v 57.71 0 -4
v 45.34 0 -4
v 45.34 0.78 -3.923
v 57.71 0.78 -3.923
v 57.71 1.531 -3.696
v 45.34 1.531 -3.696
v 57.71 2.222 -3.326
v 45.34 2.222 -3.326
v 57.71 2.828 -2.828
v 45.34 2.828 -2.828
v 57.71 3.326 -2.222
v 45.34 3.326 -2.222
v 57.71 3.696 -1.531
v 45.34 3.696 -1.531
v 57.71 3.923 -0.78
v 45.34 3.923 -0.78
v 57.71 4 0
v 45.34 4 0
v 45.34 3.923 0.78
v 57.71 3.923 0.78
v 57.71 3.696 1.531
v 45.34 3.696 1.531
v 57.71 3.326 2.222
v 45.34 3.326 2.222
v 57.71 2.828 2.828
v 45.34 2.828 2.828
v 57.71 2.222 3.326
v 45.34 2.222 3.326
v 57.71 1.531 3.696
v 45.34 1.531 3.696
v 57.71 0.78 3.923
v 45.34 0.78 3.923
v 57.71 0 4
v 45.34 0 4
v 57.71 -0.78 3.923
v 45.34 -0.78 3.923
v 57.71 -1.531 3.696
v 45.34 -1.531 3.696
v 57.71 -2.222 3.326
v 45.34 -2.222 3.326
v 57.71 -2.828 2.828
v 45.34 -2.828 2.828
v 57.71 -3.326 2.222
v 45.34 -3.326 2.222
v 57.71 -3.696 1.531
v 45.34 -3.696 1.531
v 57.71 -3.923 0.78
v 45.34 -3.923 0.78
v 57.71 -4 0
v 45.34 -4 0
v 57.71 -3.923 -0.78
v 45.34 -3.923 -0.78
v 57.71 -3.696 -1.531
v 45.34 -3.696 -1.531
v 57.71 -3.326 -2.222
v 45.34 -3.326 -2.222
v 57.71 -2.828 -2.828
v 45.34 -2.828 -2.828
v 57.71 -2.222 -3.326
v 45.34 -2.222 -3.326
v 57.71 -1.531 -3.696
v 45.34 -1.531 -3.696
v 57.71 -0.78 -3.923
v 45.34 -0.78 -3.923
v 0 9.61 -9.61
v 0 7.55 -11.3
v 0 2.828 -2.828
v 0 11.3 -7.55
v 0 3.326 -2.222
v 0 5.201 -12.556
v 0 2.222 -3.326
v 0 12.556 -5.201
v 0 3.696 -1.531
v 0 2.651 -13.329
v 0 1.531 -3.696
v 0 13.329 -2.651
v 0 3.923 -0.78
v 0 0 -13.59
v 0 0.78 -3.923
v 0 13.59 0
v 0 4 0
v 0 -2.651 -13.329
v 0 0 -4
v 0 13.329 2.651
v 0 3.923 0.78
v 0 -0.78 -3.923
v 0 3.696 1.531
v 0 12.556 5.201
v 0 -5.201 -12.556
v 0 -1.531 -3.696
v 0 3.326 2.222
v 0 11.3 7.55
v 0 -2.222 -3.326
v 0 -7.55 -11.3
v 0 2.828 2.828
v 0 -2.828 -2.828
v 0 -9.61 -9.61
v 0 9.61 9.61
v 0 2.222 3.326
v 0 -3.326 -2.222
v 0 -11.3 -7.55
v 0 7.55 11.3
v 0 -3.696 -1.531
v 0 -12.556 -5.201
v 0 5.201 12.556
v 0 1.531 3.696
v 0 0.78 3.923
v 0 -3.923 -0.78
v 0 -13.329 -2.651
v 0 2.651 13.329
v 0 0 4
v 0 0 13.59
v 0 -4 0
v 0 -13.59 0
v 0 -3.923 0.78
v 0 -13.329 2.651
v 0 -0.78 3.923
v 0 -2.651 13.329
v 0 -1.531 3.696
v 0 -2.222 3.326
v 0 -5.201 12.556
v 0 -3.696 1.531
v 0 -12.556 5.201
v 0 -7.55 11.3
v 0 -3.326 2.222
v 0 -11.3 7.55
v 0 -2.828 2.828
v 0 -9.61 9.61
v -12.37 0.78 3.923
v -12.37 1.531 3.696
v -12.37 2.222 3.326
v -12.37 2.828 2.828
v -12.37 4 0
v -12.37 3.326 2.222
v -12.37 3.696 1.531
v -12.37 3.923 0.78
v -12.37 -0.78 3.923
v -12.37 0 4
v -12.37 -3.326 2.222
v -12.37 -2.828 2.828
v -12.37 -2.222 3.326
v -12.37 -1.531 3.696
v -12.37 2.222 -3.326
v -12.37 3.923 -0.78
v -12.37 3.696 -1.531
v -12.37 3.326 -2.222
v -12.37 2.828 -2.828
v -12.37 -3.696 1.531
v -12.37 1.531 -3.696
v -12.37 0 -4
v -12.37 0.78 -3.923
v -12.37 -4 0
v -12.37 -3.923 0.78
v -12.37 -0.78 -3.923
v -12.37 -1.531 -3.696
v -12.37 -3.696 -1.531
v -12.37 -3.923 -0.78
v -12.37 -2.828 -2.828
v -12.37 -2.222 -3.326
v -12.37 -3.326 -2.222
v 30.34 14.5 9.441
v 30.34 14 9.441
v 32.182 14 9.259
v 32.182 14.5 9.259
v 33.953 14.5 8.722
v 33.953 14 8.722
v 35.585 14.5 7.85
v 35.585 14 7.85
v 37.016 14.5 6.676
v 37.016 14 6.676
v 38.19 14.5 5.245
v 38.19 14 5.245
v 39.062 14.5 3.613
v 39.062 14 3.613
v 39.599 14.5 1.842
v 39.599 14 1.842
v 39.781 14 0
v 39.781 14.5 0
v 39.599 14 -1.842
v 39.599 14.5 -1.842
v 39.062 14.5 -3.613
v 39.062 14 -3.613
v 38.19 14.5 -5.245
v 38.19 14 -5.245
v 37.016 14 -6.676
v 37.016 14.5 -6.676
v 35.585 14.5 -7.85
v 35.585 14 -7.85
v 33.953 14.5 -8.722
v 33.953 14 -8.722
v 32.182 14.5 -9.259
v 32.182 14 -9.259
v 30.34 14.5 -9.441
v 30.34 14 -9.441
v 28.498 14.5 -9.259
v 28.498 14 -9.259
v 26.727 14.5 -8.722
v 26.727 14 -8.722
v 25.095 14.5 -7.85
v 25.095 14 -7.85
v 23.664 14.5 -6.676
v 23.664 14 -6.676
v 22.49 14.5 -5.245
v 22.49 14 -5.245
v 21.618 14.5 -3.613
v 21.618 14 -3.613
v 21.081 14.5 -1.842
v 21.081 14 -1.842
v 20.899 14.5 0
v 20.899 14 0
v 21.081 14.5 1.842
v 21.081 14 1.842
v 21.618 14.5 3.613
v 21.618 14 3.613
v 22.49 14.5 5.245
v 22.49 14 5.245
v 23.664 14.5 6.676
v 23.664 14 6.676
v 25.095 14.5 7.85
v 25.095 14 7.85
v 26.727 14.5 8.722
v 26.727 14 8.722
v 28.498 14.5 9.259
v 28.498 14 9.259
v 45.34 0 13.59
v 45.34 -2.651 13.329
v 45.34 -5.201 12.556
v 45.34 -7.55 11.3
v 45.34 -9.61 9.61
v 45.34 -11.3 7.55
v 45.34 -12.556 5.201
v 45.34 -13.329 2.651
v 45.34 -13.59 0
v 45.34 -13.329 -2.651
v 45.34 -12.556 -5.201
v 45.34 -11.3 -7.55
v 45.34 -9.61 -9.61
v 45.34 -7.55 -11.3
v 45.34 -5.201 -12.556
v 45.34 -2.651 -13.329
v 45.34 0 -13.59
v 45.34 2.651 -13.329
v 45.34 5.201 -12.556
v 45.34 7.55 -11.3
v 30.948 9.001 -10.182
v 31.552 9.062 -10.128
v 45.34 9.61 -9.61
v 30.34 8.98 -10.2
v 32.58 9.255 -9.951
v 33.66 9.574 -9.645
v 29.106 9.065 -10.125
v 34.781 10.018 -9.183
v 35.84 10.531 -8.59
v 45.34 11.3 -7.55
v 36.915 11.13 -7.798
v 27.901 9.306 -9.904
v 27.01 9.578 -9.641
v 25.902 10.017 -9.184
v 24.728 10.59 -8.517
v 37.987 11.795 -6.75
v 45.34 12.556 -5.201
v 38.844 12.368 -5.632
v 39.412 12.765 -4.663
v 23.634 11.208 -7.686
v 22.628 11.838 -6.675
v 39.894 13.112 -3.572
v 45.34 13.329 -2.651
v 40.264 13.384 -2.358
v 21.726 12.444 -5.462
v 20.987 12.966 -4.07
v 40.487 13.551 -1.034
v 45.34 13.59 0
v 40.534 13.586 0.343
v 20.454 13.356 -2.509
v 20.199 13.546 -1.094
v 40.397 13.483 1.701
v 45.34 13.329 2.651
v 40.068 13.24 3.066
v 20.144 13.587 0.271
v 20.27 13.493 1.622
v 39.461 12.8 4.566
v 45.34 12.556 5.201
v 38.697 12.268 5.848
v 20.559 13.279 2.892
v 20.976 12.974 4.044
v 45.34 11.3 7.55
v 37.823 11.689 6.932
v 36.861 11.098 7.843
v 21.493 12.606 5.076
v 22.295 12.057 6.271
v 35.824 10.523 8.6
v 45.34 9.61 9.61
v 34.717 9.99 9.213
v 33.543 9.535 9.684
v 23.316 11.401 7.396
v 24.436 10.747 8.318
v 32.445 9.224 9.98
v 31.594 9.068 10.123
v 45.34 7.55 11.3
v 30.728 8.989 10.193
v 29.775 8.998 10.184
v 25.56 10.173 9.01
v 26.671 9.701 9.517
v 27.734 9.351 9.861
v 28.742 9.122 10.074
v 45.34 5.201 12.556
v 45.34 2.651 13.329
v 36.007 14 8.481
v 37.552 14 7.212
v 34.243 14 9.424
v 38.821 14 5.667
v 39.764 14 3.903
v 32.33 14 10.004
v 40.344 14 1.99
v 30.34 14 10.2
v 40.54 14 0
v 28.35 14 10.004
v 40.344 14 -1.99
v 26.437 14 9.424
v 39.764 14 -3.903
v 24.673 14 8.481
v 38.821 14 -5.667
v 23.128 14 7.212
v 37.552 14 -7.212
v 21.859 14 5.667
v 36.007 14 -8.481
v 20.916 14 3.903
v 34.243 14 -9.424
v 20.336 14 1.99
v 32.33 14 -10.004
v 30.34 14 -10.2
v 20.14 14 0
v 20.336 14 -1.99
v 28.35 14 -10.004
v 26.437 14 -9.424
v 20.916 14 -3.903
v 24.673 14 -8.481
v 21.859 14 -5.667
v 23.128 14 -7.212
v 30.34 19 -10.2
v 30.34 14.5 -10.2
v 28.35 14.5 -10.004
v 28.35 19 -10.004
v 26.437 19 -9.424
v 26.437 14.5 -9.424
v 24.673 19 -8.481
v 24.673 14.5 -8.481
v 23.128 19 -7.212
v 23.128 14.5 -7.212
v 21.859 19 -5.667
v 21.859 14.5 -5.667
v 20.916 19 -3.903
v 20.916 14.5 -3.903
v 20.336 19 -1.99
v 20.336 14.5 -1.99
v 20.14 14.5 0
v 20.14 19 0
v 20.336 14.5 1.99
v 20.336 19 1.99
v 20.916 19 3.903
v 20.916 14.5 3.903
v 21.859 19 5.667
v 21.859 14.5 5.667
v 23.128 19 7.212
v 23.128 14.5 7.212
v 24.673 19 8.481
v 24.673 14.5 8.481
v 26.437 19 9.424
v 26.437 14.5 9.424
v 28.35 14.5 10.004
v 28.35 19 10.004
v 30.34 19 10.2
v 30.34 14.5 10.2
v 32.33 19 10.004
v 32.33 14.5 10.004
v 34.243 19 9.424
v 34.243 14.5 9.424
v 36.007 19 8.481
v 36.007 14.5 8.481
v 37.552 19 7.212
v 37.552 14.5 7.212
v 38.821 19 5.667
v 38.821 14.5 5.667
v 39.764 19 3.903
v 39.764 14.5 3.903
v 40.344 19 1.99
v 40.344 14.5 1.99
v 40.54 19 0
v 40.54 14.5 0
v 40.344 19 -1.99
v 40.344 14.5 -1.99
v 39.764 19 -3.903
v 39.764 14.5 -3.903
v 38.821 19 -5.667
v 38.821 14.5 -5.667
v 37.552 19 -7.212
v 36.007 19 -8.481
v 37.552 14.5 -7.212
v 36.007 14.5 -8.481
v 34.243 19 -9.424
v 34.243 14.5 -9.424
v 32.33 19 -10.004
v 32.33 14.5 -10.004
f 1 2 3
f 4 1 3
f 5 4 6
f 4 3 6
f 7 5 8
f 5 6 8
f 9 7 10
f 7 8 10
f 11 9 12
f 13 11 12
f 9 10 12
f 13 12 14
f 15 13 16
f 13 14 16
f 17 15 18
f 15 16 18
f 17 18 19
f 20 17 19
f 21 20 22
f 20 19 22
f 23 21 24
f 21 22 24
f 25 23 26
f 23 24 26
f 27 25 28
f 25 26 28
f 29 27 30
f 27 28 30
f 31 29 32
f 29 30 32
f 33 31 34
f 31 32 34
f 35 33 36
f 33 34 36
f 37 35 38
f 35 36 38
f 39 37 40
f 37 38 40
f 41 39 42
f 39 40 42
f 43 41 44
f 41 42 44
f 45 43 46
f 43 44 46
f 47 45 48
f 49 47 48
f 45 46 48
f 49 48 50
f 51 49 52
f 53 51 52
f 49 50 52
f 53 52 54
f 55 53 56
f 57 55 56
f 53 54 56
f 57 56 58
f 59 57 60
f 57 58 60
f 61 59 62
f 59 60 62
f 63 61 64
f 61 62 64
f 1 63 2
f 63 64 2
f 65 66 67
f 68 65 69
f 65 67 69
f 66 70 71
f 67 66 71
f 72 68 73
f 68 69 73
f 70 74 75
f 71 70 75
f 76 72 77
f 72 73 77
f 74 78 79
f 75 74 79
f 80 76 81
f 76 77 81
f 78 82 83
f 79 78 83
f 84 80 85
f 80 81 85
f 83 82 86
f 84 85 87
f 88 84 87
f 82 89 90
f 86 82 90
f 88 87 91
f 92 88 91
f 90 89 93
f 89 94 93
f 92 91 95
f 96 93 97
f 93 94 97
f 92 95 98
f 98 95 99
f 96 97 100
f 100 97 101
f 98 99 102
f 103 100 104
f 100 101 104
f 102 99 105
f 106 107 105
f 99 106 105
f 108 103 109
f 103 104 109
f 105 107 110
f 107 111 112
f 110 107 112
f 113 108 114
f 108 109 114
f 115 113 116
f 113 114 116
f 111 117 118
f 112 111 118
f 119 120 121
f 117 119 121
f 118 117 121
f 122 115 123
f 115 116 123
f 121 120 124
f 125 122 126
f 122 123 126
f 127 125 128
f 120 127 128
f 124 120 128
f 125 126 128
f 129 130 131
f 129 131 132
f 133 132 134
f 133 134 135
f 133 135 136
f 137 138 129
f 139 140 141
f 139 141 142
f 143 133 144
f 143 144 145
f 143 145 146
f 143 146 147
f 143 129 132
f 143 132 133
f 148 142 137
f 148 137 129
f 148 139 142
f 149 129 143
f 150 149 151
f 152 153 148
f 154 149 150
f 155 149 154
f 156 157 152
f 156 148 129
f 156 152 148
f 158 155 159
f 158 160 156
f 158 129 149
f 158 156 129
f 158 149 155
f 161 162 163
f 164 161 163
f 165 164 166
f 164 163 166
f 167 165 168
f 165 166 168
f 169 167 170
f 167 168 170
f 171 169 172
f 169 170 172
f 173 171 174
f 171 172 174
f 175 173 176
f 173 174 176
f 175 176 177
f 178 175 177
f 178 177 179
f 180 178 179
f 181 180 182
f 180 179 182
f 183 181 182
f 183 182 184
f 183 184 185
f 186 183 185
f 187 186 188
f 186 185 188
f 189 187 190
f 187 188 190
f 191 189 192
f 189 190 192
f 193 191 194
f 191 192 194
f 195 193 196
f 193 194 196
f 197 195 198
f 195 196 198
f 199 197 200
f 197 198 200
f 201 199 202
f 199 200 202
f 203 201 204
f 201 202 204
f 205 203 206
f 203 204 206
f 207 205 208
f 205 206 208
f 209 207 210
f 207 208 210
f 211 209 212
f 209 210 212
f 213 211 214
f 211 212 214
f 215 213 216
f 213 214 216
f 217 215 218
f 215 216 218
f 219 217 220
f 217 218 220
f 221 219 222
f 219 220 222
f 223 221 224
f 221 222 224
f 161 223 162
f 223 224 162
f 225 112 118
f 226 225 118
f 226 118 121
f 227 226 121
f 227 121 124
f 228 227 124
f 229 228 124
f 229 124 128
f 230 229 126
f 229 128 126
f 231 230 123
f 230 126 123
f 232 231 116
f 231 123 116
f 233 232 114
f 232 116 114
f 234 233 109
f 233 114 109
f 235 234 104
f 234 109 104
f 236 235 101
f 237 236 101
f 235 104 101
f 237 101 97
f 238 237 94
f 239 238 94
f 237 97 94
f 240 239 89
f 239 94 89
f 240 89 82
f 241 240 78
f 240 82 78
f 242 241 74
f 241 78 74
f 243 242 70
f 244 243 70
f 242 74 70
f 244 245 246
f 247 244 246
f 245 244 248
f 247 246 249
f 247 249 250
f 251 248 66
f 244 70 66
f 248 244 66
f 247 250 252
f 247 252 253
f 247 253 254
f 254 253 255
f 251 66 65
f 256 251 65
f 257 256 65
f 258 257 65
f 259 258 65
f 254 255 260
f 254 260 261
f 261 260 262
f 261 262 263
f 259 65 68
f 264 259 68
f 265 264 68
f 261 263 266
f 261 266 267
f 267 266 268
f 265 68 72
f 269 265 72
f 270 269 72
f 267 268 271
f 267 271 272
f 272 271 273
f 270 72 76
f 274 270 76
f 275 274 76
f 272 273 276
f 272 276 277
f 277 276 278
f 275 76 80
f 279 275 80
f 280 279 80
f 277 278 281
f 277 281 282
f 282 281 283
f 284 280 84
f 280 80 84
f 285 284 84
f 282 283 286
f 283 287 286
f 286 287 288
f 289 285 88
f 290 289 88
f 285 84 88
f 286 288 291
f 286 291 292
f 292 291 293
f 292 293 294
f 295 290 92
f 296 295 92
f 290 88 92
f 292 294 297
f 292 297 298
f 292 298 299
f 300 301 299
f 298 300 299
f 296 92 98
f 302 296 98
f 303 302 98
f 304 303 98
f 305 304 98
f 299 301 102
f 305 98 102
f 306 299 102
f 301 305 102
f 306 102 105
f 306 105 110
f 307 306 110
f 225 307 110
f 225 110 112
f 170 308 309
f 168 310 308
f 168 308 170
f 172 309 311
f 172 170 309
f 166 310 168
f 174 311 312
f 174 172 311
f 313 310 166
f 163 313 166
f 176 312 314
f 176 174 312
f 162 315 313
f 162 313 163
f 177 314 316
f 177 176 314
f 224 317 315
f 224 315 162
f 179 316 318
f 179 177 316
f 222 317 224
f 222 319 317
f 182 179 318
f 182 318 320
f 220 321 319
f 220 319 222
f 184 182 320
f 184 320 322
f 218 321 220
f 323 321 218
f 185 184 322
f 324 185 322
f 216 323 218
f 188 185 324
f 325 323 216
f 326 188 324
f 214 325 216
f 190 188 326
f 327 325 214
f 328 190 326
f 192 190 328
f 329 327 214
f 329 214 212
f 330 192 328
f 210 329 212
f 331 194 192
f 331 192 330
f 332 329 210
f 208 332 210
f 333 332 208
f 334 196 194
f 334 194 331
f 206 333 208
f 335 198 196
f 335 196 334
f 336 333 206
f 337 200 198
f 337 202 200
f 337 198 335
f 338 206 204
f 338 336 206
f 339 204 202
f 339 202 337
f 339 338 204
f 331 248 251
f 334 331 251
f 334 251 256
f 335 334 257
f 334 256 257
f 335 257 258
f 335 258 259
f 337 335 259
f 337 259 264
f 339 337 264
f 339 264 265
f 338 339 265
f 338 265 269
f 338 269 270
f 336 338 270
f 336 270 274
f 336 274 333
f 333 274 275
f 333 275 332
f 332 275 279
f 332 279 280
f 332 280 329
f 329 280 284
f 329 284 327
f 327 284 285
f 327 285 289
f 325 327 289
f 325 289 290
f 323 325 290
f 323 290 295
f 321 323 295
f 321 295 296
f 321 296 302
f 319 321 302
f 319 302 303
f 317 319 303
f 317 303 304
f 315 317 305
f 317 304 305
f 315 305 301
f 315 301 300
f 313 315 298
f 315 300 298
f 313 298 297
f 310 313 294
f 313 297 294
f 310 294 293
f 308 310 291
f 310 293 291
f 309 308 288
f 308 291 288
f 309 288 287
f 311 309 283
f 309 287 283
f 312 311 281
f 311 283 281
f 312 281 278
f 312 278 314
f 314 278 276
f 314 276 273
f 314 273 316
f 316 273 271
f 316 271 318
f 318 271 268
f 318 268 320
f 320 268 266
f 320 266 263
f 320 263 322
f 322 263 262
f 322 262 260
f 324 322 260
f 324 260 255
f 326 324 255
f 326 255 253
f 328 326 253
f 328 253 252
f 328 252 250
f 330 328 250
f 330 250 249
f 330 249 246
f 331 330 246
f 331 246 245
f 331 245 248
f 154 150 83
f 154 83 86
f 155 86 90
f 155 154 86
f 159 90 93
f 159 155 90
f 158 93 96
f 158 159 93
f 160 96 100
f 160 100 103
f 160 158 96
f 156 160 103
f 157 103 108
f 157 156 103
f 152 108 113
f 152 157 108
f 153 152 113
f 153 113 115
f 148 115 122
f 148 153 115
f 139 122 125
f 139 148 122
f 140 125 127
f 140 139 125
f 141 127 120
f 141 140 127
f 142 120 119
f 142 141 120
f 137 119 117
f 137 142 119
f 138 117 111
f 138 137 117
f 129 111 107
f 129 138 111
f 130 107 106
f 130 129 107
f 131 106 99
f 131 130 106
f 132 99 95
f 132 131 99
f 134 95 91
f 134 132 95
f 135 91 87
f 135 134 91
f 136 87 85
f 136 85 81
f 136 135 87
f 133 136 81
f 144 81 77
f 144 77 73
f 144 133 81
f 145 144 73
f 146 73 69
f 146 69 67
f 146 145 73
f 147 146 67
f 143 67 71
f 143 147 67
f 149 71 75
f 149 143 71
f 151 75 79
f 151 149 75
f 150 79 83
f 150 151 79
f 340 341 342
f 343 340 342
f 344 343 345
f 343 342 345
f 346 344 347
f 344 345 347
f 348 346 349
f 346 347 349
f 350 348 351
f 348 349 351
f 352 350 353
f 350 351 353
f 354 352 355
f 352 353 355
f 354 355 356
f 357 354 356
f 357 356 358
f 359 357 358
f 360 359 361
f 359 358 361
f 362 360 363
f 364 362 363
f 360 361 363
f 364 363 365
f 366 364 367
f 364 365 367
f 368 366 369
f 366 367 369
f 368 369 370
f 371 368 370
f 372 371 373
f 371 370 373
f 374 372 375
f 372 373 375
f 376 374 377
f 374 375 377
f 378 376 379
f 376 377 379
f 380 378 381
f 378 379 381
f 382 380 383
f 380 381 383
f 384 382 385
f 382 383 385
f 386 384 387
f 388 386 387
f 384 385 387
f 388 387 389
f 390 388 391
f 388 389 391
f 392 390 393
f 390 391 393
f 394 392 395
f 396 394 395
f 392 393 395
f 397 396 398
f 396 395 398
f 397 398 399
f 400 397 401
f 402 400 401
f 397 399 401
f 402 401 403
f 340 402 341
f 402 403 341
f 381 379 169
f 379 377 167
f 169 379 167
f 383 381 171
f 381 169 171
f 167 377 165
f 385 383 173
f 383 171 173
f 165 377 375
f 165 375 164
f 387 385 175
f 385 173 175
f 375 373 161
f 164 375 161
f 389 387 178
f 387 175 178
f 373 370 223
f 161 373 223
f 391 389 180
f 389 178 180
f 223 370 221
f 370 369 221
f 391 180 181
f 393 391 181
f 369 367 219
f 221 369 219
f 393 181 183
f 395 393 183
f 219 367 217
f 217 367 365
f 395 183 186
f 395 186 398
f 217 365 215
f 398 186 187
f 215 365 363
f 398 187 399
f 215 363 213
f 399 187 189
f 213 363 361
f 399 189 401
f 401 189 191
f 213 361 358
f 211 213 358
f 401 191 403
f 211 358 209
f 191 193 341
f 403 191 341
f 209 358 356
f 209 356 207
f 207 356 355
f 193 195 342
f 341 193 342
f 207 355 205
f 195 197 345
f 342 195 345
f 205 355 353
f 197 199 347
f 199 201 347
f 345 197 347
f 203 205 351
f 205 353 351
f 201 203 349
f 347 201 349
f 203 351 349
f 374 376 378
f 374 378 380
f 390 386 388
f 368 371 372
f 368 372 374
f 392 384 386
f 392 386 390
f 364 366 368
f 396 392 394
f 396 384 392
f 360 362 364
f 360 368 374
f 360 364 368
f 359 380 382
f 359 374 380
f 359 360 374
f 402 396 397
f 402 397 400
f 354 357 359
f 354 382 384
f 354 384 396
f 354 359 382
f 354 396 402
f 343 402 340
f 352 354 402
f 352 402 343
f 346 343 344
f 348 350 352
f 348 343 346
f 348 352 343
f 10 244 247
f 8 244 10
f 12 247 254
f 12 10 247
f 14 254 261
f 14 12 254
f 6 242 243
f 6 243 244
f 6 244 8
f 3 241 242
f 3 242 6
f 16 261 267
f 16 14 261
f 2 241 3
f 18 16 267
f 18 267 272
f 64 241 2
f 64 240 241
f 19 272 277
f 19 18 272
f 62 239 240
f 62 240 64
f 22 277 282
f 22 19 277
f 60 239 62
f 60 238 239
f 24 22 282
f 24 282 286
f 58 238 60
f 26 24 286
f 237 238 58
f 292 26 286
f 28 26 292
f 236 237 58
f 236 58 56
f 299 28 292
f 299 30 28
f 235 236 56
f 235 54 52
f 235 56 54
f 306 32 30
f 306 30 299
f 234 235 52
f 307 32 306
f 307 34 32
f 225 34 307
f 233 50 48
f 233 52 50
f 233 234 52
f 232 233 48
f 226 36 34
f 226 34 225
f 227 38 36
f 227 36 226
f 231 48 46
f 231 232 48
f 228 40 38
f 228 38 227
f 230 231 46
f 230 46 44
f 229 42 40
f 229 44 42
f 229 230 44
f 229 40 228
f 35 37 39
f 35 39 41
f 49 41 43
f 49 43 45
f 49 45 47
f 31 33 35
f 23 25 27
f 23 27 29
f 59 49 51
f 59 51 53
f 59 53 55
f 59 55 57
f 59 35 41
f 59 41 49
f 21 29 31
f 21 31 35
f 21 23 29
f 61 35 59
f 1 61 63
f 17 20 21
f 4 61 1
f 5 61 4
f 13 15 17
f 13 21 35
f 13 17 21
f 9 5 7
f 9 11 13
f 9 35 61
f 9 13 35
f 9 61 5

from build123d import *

# Parameters (mm, degrees)
CROQUIS1_R              = 13.59
SALIENTE_EXTRUIR1_DEPTH = 45.34
CROQUIS2_R              = 4
SALIENTE_EXTRUIR2_DEPTH = 12.37
SALIENTE_EXTRUIR3_START = 12.37
CROQUIS3_R              = 4
SALIENTE_EXTRUIR3_DEPTH = 12.37
CROQUIS4_R              = 10.2
SALIENTE_EXTRUIR4_DEPTH = 14
CROQUIS5_R              = 9.44075635
SALIENTE_EXTRUIR5_DEPTH = 0.5
CROQUIS6_R              = 10.2
SALIENTE_EXTRUIR6_DEPTH = 4.5


with BuildPart() as part:
    # Croquis1 → Saliente-Extruir1 (new body)
    with BuildSketch(Plane(origin=(0, 0, 0), x_dir=(0, 0, -1), z_dir=(1, 0, 0))):
        with Locations(Location((0, 0, 0), (0, 0, 180))):
            Circle(CROQUIS1_R)
    extrude(amount=SALIENTE_EXTRUIR1_DEPTH)

    # Croquis2 → Saliente-Extruir2 (add)
    with BuildSketch(Plane(origin=(45.34, 0, 0), x_dir=(0, 0, -1), z_dir=(1, 0, 0))):
        Circle(CROQUIS2_R)
    extrude(amount=SALIENTE_EXTRUIR2_DEPTH)

    # Croquis3 → Saliente-Extruir3 (add)
    with BuildSketch(Plane.ZY.offset(SALIENTE_EXTRUIR3_START)):
        with Locations(Location((0, 0, 0), (0, 0, 180))):
            Circle(CROQUIS3_R)
    extrude(amount=-SALIENTE_EXTRUIR3_DEPTH)

    # Croquis4 → Saliente-Extruir4 (add)
    with BuildSketch(Plane(origin=(0, 0, 0), x_dir=(1, 0, 0), z_dir=(0, 1, 0))):
        with Locations(Location((30.34, 0, 0), (0, 0, 90))):
            Circle(CROQUIS4_R)
    extrude(amount=SALIENTE_EXTRUIR4_DEPTH)

    # Croquis5 → Saliente-Extruir5 (add)
    with BuildSketch(Plane(origin=(0, 14, 0), x_dir=(1, 0, 0), z_dir=(0, 1, 0))):
        with Locations(Location((30.34, 0, 0), (0, 0, 270))):
            Circle(CROQUIS5_R)
    extrude(amount=SALIENTE_EXTRUIR5_DEPTH)

    # Croquis6 → Saliente-Extruir6 (add)
    with BuildSketch(Plane(origin=(0, 14.5, 0), x_dir=(1, 0, 0), z_dir=(0, 1, 0))):
        with Locations(Location((30.34, 0, 0), (0, 0, 90))):
            Circle(CROQUIS6_R)
    extrude(amount=SALIENTE_EXTRUIR6_DEPTH)


solid = part.part
